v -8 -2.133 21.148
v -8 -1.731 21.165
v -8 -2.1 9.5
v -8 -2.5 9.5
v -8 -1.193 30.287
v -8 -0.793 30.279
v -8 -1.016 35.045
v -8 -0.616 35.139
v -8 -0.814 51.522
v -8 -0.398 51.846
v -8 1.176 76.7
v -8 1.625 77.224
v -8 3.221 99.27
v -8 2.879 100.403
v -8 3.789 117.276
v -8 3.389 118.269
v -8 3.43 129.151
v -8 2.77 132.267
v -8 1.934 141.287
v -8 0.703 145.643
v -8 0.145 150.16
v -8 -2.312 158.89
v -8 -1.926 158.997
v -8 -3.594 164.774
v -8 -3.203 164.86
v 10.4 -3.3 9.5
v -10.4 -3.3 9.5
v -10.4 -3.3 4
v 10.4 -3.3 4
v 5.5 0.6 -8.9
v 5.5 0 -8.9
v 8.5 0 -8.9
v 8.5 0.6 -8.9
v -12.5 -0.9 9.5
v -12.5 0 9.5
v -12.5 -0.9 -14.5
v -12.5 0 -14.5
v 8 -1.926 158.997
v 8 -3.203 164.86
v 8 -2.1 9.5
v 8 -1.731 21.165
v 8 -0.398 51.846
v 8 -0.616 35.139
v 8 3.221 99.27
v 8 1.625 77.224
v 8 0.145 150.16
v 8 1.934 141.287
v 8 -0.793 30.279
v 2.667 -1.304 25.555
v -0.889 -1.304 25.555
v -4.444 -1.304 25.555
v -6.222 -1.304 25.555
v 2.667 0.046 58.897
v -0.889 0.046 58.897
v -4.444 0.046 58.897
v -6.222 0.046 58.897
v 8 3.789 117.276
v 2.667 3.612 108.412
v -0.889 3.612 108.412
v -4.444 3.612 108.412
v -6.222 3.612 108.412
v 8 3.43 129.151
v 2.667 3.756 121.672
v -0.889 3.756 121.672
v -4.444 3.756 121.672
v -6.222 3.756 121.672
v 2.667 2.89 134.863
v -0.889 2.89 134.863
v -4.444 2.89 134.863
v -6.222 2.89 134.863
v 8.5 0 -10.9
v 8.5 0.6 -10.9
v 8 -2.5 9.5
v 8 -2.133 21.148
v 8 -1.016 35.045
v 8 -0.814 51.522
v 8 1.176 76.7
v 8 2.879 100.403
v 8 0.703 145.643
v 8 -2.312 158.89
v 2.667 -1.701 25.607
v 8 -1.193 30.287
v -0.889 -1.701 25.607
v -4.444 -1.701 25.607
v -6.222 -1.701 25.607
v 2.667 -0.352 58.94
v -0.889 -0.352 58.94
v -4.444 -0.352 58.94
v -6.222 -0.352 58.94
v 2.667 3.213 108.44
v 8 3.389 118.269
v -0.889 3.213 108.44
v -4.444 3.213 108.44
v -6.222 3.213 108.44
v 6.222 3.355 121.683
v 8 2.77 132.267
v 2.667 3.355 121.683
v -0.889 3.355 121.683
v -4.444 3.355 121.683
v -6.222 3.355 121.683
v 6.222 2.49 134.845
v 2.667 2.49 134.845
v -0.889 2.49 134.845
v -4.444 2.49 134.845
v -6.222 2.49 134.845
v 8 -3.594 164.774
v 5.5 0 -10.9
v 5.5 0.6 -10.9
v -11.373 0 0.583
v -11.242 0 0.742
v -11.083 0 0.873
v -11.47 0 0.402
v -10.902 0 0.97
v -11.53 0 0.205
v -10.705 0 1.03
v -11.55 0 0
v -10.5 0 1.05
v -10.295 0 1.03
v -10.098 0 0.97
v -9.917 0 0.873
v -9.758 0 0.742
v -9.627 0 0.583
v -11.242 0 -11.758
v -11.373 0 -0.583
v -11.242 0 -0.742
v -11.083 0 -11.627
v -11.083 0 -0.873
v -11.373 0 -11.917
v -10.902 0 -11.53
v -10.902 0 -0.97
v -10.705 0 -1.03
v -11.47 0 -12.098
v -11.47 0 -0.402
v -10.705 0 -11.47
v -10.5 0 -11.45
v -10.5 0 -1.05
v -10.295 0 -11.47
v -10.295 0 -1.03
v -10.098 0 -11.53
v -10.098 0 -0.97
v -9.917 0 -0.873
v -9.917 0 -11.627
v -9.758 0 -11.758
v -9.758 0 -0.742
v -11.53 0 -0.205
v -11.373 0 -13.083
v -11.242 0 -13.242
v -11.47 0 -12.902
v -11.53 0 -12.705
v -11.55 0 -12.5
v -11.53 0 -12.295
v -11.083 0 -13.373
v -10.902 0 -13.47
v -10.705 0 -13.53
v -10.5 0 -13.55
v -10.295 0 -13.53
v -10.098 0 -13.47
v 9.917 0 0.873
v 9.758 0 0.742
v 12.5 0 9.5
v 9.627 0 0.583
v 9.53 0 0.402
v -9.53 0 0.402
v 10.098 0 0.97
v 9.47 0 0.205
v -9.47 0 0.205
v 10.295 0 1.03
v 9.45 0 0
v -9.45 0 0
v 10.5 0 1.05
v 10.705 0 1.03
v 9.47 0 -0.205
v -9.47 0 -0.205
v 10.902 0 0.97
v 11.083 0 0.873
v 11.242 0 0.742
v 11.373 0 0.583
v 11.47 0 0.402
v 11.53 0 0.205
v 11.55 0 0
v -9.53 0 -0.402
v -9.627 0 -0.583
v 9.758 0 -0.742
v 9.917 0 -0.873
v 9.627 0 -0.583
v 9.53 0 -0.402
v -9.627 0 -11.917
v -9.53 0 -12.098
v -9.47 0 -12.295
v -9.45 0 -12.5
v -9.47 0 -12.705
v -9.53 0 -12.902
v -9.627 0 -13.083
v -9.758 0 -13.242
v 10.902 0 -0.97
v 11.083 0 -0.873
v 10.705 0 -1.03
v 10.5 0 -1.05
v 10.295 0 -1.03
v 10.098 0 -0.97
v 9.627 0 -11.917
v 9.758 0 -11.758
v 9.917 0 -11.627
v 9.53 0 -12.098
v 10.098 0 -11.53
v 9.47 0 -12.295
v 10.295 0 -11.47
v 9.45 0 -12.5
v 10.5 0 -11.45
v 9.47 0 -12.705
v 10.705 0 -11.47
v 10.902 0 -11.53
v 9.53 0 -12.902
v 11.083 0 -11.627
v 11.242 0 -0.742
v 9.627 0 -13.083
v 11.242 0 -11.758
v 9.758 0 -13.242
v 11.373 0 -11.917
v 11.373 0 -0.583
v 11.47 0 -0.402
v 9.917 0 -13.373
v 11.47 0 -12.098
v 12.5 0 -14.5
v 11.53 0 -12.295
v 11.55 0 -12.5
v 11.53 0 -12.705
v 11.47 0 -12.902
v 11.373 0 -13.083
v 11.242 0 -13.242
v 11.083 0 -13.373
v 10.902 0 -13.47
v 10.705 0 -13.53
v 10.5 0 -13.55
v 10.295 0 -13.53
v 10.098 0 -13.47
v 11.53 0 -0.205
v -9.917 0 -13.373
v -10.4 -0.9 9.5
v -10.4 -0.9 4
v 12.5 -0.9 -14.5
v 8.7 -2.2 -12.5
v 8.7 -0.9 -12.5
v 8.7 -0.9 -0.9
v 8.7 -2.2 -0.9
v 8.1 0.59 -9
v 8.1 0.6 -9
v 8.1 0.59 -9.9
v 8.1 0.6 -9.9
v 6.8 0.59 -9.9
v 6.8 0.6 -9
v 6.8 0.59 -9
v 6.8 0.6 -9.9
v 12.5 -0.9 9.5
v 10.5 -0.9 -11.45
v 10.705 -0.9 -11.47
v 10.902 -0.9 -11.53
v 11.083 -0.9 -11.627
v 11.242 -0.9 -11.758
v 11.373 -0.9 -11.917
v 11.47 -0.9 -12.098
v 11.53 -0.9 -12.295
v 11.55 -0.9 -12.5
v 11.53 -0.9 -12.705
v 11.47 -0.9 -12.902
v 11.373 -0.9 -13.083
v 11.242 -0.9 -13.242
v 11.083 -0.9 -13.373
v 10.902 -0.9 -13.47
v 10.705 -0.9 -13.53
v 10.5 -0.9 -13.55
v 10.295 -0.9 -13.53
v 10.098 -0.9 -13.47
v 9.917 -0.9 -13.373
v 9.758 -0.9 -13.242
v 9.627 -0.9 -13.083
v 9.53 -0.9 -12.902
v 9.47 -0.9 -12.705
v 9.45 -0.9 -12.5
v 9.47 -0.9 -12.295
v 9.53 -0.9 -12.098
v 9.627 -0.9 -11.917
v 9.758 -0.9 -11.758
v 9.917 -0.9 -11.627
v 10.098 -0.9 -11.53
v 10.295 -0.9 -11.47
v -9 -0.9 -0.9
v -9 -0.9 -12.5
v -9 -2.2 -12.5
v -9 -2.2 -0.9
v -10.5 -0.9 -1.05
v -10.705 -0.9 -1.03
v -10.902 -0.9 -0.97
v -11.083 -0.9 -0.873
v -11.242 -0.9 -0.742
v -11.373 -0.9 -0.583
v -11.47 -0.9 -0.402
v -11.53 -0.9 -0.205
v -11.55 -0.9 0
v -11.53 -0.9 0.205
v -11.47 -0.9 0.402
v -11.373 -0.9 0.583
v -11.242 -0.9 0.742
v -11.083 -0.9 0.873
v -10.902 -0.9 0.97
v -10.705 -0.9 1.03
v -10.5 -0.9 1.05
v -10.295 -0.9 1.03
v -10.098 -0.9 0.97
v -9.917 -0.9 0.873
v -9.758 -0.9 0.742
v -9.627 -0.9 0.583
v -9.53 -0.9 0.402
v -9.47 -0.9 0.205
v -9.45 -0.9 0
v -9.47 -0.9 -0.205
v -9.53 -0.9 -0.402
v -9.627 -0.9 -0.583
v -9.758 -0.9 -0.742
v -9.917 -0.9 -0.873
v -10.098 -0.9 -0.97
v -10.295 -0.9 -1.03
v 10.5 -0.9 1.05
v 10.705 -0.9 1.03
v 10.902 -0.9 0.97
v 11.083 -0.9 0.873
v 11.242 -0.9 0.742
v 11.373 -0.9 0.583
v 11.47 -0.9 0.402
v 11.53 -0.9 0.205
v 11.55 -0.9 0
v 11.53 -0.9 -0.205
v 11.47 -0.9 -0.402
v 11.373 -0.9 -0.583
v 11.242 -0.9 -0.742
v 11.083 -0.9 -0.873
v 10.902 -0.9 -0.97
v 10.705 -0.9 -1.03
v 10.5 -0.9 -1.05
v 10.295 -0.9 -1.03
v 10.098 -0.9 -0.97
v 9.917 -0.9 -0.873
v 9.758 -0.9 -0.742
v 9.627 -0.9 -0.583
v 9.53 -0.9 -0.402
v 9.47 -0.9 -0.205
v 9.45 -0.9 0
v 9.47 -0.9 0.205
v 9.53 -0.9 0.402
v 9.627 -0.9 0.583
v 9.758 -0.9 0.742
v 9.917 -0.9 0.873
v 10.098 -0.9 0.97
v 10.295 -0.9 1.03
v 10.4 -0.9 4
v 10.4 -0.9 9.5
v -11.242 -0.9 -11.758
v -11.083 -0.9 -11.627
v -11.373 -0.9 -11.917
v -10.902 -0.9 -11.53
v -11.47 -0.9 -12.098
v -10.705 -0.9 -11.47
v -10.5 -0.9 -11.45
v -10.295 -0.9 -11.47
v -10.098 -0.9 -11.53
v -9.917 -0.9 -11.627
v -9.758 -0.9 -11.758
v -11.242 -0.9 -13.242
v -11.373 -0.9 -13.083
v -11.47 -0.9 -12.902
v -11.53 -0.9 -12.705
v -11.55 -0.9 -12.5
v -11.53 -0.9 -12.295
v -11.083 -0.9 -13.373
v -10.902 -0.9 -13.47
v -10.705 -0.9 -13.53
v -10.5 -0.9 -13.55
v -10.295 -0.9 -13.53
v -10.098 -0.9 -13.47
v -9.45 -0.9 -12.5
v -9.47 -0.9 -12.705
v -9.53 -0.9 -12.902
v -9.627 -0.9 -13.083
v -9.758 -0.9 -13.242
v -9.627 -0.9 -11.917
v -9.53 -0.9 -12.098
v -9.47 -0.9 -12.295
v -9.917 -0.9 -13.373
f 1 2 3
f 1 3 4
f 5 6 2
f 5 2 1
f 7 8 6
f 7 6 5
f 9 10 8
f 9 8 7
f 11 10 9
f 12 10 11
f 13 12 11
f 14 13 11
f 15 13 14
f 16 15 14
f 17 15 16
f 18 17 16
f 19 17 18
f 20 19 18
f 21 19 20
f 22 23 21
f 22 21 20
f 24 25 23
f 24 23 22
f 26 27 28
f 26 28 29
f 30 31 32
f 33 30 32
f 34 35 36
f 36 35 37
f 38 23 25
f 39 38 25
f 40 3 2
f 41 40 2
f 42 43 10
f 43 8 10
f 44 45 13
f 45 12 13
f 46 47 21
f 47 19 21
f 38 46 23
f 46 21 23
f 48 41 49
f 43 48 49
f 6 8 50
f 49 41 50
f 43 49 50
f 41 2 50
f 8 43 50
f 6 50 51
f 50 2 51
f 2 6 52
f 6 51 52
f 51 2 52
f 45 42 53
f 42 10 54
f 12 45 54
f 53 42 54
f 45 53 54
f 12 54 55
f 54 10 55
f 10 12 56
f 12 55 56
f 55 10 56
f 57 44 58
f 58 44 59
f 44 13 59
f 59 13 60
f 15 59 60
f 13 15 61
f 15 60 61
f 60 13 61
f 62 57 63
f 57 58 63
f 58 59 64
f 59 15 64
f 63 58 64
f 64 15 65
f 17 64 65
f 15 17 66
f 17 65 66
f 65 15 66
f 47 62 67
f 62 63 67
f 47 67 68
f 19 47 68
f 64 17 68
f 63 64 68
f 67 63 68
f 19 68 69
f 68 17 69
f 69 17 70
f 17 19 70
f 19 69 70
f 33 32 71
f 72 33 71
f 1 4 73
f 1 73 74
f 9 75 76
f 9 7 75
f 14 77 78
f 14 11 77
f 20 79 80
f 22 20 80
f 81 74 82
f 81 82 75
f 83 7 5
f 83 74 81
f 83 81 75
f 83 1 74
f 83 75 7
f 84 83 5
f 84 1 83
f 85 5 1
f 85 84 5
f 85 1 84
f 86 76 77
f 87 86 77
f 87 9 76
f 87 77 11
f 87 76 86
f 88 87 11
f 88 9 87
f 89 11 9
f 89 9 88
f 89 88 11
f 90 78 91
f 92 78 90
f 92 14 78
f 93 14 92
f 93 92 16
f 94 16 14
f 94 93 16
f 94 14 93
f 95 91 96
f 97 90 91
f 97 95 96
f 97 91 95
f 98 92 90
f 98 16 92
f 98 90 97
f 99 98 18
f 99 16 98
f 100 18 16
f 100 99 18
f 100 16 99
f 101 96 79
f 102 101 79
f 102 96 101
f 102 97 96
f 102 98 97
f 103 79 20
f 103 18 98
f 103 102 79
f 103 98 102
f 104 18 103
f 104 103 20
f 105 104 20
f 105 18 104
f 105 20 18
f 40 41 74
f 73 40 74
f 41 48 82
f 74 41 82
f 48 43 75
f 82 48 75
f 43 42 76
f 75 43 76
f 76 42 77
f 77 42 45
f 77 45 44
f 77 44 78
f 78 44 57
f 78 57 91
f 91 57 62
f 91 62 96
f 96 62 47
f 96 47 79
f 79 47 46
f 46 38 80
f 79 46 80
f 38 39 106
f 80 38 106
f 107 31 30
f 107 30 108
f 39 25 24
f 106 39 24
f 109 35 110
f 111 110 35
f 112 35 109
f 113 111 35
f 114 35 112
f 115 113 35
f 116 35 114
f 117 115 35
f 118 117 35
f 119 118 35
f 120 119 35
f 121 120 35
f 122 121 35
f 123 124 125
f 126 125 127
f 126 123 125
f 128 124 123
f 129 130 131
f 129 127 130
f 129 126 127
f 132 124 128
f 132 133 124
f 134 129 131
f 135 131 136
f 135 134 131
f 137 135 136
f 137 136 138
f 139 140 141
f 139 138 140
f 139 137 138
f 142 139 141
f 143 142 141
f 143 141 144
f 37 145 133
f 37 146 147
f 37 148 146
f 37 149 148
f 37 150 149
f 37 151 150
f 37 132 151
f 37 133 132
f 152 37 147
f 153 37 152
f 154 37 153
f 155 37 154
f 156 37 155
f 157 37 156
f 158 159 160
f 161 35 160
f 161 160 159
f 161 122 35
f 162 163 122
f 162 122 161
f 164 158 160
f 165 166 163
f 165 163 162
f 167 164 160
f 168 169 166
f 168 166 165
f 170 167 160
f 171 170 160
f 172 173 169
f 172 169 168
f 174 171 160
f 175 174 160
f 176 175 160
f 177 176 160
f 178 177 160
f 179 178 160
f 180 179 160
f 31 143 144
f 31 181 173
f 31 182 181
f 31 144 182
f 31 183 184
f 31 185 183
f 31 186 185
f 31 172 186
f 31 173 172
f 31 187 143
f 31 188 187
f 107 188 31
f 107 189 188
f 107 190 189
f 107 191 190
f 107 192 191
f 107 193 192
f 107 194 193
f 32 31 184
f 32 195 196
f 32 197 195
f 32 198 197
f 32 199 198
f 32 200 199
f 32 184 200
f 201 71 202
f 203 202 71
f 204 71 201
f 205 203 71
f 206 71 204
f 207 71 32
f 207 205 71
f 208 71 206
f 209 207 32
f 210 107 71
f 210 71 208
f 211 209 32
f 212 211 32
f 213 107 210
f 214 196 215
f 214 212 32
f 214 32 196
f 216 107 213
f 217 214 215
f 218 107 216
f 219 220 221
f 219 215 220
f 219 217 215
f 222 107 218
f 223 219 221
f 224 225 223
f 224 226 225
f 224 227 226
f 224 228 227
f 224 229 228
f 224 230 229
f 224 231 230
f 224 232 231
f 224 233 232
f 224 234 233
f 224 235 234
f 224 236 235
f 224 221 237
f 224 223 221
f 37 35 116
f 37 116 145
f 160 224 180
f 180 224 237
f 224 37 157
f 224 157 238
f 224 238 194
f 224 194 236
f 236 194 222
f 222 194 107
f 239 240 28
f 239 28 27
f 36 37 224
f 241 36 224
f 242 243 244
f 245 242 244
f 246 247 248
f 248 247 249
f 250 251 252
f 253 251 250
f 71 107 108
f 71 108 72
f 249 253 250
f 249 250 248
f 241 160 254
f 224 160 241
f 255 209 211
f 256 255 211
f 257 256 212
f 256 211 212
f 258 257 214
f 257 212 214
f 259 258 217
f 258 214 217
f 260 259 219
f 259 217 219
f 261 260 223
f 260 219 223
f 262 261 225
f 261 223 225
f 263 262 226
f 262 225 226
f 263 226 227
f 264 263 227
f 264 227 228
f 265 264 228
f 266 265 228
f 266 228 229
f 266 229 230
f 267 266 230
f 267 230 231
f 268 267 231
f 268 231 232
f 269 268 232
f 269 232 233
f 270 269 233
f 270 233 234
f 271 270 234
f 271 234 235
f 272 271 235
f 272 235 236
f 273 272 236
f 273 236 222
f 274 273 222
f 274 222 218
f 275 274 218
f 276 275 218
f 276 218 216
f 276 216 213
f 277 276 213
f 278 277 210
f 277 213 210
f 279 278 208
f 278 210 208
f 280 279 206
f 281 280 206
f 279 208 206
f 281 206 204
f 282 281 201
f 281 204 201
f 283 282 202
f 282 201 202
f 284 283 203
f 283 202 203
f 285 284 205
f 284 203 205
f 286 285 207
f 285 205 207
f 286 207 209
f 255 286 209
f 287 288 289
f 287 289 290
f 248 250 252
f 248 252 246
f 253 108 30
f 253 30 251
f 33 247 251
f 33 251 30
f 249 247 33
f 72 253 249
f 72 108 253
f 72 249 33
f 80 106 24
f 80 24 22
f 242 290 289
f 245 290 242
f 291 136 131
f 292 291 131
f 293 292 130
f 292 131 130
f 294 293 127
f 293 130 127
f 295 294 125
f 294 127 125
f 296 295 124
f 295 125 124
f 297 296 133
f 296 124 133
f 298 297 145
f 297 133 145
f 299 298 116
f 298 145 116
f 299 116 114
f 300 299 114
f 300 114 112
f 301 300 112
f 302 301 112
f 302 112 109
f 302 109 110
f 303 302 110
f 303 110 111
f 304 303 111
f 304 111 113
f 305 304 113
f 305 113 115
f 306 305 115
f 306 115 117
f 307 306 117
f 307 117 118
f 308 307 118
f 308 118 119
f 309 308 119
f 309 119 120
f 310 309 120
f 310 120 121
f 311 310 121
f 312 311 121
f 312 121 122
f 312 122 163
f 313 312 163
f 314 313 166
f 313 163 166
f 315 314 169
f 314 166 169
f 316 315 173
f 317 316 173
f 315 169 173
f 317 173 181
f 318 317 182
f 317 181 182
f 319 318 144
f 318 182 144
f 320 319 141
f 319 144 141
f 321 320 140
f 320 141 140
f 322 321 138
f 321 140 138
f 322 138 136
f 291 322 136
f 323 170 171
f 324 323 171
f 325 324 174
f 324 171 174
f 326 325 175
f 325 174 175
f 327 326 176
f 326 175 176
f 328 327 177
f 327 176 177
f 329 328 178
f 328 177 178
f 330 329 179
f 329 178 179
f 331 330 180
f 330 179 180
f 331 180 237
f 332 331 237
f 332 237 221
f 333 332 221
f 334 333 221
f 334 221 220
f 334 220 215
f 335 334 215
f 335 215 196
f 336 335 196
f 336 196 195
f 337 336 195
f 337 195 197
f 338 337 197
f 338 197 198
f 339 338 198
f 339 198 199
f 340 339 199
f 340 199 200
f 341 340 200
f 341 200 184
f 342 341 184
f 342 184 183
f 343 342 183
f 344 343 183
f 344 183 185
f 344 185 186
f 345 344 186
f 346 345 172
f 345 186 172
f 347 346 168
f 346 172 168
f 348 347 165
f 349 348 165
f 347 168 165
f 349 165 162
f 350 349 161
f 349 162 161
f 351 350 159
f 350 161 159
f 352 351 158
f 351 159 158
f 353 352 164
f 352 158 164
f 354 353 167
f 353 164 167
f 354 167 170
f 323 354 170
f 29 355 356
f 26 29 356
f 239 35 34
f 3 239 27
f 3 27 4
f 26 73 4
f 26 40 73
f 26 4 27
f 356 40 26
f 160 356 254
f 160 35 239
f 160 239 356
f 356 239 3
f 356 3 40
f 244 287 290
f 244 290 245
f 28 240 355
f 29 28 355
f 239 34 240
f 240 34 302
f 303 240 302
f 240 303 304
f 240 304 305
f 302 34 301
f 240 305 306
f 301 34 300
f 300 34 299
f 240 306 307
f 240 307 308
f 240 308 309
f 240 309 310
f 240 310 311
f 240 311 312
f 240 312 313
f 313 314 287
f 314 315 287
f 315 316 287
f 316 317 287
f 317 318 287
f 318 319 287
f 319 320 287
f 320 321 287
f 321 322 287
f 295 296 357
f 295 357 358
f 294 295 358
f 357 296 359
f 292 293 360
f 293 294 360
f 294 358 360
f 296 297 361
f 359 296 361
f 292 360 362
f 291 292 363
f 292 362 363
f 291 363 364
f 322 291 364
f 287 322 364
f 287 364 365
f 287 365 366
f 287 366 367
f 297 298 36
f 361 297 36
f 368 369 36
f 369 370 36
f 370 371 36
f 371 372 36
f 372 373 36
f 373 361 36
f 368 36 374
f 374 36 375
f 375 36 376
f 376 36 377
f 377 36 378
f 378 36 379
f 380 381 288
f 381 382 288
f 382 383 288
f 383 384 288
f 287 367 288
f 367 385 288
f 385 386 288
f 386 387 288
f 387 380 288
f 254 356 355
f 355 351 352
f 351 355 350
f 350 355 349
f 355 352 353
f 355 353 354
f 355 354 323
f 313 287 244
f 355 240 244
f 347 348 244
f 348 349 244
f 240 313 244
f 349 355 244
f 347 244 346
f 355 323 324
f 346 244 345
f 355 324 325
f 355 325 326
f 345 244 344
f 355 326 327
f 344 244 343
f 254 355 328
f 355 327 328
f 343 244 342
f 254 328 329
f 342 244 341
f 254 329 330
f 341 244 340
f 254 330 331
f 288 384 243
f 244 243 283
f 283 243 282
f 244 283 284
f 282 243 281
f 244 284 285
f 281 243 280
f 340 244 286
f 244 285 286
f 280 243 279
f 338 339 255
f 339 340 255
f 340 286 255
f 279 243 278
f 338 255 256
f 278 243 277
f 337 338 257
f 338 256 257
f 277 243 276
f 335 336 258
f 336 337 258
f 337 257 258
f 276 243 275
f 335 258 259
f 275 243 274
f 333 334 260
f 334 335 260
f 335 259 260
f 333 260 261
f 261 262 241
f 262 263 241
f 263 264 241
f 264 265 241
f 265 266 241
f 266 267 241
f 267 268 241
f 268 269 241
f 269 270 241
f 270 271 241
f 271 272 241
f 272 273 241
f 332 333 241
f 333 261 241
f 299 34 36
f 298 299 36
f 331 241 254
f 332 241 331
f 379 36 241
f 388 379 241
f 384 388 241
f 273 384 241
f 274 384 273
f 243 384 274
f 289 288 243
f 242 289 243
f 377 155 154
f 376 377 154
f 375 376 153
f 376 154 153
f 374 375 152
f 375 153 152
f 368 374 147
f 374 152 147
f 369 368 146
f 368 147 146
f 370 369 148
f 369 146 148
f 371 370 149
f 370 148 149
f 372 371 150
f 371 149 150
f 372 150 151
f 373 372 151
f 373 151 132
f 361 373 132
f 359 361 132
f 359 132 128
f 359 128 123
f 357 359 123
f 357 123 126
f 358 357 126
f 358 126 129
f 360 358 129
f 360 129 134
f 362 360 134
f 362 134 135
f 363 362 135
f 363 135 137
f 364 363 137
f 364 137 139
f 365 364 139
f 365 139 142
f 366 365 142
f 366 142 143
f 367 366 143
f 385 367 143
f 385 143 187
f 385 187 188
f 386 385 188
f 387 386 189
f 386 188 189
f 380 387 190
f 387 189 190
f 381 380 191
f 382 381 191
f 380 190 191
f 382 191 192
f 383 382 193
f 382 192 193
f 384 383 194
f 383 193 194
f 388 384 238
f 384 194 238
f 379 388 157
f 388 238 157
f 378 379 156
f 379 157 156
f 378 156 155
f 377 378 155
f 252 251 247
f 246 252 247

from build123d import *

# Parameters (mm, degrees)
SKIZZE1_W                                 = 25
SKIZZE1_H                                 = 24
PCB_DEPTH                                 = 0.9
SKIZZE2_R                                 = 1.05
MOUNTING_HOLES_DEPTH                      = 20.165333287
SKIZZE3_W                                 = 20.8
SKIZZE3_H                                 = 5.5
CONNECTOR_CLOSED_DEPTH                    = 2.4
SKIZZE4_W                                 = 17.7
SKIZZE4_H                                 = 11.6
COMPONENTS_WORST_CASE_BOUNDARY_BOX_DEPTH  = 1.3
CABLE_156MM_FREE_LENGTH_START             = -8
CABLE_156MM_FREE_LENGTH_DEPTH             = 16
SKIZZE7_W                                 = 3
SKIZZE7_H                                 = 2
COMPONENTS_WORST_CASE_BOUNDARY_BOX2_DEPTH = 0.6
SKIZZE8_W                                 = 1.3
SKIZZE8_H                                 = 0.9
STATUS_LED_DEPTH                          = 0.01


# Read off the part's stored shape, not the designer's step: Cable_156mm_free_Length
with BuildPart() as part:
    # Skizze1 → PCB (new body)
    with BuildSketch(Plane(origin=(0, 0, 0), x_dir=(1, 0, 0), z_dir=(0, 1, 0))):
        with Locations((0, 2.5)):
            Rectangle(SKIZZE1_W, SKIZZE1_H)
    extrude(amount=-PCB_DEPTH)

    # Skizze2 → Mounting_Holes (cut, through all)
    with BuildSketch(Plane(origin=(0, 0, 0), x_dir=(1, 0, 0), z_dir=(0, 1, 0))):
        with Locations(Location((10.5, 12.5, 0), (0, 0, 270))):
            Circle(SKIZZE2_R)
        with Locations(Location((10.5, 0, 0), (0, 0, 270))):
            Circle(SKIZZE2_R)
        with Locations(Location((-10.5, 0, 0), (0, 0, 90))):
            Circle(SKIZZE2_R)
        with Locations(Location((-10.5, 12.5, 0), (0, 0, 90))):
            Circle(SKIZZE2_R)
    extrude(amount=-MOUNTING_HOLES_DEPTH, mode=Mode.SUBTRACT)

    # Skizze3 → Connector_closed (add)
    with BuildSketch(Plane.XZ.offset(0.9)):
        with Locations((0, 6.75)):
            Rectangle(SKIZZE3_W, SKIZZE3_H)
    extrude(amount=CONNECTOR_CLOSED_DEPTH)

    # Skizze4 → Components_worst-case_Boundary-Box (add)
    with BuildSketch(Plane.XZ.offset(0.9)):
        with Locations((-0.15, -6.7)):
            Rectangle(SKIZZE4_W, SKIZZE4_H)
    extrude(amount=COMPONENTS_WORST_CASE_BOUNDARY_BOX_DEPTH)

    # Cable_156mm_free_Length outline → Cable_156mm_free_Length (add)
    with BuildSketch(Plane.YZ.offset(CABLE_156MM_FREE_LENGTH_START)):
        with BuildLine():
            add(Edge.make_bspline(
                [(-2.5, 9.5), (-2.475225113, 12.836586164), (-2.435306032, 18.21273383), (-1.780893788, 25.199891819), (-0.848086938, 32.316273634), (-1.279790623, 43.443994082), (-0.388416893, 60.791916601), (1.903305425, 83.198557796), (3.468421225, 108.473808964), (3.57358047, 134.366469325), (-0.398617572, 150.91775474), (-2.311961718, 158.890243708)],
                knots=[0, 0, 0, 0, 0.066565355, 0.107254889, 0.139591388, 0.210160277, 0.329584285, 0.485565806, 0.660213078, 0.836330084, 1, 1, 1, 1], degree=3))
            Line((-2.5, 9.5), (-2.1, 9.5))
            add(Edge.make_bspline(
                [(-2.1, 9.5), (-2.074945976, 12.831496447), (-2.03457713, 18.199443194), (-1.385285743, 25.13899131), (-0.448711873, 32.285274364), (-0.878853095, 43.46148369), (0.008252641, 60.724222754), (2.300661353, 83.153569069), (3.867117874, 108.441464768), (3.977764902, 134.372552415), (-0.006644422, 150.991885803), (-1.925870548, 158.99715239)],
                knots=[0, 0, 0, 0, 0.066565355, 0.107254889, 0.139591388, 0.210160277, 0.329584285, 0.485565806, 0.660213078, 0.836330084, 1, 1, 1, 1], degree=3))
            Line((-1.925870548, 158.99715239), (-3.203138794, 164.859625062))
            Line((-3.203138794, 164.859625062), (-3.593970306, 164.774473846))
            Line((-3.593970306, 164.774473846), (-2.311961718, 158.890243708))
        make_face()
    extrude(amount=CABLE_156MM_FREE_LENGTH_DEPTH)

    # Skizze7 → Components_worst-case_Boundary-Box2 (add)
    with BuildSketch(Plane(origin=(0, 0, 0), x_dir=(1, 0, 0), z_dir=(0, 1, 0))):
        with Locations((7, 9.9)):
            Rectangle(SKIZZE7_W, SKIZZE7_H)
    extrude(amount=COMPONENTS_WORST_CASE_BOUNDARY_BOX2_DEPTH)

    # Skizze8 → Status_LED (cut)
    with BuildSketch(Plane(origin=(0, 0.6, 0), x_dir=(1, 0, 0), z_dir=(0, 1, 0))):
        with Locations((7.45, 9.45)):
            Rectangle(SKIZZE8_W, SKIZZE8_H)
    extrude(amount=-STATUS_LED_DEPTH, mode=Mode.SUBTRACT)


solid = part.part
